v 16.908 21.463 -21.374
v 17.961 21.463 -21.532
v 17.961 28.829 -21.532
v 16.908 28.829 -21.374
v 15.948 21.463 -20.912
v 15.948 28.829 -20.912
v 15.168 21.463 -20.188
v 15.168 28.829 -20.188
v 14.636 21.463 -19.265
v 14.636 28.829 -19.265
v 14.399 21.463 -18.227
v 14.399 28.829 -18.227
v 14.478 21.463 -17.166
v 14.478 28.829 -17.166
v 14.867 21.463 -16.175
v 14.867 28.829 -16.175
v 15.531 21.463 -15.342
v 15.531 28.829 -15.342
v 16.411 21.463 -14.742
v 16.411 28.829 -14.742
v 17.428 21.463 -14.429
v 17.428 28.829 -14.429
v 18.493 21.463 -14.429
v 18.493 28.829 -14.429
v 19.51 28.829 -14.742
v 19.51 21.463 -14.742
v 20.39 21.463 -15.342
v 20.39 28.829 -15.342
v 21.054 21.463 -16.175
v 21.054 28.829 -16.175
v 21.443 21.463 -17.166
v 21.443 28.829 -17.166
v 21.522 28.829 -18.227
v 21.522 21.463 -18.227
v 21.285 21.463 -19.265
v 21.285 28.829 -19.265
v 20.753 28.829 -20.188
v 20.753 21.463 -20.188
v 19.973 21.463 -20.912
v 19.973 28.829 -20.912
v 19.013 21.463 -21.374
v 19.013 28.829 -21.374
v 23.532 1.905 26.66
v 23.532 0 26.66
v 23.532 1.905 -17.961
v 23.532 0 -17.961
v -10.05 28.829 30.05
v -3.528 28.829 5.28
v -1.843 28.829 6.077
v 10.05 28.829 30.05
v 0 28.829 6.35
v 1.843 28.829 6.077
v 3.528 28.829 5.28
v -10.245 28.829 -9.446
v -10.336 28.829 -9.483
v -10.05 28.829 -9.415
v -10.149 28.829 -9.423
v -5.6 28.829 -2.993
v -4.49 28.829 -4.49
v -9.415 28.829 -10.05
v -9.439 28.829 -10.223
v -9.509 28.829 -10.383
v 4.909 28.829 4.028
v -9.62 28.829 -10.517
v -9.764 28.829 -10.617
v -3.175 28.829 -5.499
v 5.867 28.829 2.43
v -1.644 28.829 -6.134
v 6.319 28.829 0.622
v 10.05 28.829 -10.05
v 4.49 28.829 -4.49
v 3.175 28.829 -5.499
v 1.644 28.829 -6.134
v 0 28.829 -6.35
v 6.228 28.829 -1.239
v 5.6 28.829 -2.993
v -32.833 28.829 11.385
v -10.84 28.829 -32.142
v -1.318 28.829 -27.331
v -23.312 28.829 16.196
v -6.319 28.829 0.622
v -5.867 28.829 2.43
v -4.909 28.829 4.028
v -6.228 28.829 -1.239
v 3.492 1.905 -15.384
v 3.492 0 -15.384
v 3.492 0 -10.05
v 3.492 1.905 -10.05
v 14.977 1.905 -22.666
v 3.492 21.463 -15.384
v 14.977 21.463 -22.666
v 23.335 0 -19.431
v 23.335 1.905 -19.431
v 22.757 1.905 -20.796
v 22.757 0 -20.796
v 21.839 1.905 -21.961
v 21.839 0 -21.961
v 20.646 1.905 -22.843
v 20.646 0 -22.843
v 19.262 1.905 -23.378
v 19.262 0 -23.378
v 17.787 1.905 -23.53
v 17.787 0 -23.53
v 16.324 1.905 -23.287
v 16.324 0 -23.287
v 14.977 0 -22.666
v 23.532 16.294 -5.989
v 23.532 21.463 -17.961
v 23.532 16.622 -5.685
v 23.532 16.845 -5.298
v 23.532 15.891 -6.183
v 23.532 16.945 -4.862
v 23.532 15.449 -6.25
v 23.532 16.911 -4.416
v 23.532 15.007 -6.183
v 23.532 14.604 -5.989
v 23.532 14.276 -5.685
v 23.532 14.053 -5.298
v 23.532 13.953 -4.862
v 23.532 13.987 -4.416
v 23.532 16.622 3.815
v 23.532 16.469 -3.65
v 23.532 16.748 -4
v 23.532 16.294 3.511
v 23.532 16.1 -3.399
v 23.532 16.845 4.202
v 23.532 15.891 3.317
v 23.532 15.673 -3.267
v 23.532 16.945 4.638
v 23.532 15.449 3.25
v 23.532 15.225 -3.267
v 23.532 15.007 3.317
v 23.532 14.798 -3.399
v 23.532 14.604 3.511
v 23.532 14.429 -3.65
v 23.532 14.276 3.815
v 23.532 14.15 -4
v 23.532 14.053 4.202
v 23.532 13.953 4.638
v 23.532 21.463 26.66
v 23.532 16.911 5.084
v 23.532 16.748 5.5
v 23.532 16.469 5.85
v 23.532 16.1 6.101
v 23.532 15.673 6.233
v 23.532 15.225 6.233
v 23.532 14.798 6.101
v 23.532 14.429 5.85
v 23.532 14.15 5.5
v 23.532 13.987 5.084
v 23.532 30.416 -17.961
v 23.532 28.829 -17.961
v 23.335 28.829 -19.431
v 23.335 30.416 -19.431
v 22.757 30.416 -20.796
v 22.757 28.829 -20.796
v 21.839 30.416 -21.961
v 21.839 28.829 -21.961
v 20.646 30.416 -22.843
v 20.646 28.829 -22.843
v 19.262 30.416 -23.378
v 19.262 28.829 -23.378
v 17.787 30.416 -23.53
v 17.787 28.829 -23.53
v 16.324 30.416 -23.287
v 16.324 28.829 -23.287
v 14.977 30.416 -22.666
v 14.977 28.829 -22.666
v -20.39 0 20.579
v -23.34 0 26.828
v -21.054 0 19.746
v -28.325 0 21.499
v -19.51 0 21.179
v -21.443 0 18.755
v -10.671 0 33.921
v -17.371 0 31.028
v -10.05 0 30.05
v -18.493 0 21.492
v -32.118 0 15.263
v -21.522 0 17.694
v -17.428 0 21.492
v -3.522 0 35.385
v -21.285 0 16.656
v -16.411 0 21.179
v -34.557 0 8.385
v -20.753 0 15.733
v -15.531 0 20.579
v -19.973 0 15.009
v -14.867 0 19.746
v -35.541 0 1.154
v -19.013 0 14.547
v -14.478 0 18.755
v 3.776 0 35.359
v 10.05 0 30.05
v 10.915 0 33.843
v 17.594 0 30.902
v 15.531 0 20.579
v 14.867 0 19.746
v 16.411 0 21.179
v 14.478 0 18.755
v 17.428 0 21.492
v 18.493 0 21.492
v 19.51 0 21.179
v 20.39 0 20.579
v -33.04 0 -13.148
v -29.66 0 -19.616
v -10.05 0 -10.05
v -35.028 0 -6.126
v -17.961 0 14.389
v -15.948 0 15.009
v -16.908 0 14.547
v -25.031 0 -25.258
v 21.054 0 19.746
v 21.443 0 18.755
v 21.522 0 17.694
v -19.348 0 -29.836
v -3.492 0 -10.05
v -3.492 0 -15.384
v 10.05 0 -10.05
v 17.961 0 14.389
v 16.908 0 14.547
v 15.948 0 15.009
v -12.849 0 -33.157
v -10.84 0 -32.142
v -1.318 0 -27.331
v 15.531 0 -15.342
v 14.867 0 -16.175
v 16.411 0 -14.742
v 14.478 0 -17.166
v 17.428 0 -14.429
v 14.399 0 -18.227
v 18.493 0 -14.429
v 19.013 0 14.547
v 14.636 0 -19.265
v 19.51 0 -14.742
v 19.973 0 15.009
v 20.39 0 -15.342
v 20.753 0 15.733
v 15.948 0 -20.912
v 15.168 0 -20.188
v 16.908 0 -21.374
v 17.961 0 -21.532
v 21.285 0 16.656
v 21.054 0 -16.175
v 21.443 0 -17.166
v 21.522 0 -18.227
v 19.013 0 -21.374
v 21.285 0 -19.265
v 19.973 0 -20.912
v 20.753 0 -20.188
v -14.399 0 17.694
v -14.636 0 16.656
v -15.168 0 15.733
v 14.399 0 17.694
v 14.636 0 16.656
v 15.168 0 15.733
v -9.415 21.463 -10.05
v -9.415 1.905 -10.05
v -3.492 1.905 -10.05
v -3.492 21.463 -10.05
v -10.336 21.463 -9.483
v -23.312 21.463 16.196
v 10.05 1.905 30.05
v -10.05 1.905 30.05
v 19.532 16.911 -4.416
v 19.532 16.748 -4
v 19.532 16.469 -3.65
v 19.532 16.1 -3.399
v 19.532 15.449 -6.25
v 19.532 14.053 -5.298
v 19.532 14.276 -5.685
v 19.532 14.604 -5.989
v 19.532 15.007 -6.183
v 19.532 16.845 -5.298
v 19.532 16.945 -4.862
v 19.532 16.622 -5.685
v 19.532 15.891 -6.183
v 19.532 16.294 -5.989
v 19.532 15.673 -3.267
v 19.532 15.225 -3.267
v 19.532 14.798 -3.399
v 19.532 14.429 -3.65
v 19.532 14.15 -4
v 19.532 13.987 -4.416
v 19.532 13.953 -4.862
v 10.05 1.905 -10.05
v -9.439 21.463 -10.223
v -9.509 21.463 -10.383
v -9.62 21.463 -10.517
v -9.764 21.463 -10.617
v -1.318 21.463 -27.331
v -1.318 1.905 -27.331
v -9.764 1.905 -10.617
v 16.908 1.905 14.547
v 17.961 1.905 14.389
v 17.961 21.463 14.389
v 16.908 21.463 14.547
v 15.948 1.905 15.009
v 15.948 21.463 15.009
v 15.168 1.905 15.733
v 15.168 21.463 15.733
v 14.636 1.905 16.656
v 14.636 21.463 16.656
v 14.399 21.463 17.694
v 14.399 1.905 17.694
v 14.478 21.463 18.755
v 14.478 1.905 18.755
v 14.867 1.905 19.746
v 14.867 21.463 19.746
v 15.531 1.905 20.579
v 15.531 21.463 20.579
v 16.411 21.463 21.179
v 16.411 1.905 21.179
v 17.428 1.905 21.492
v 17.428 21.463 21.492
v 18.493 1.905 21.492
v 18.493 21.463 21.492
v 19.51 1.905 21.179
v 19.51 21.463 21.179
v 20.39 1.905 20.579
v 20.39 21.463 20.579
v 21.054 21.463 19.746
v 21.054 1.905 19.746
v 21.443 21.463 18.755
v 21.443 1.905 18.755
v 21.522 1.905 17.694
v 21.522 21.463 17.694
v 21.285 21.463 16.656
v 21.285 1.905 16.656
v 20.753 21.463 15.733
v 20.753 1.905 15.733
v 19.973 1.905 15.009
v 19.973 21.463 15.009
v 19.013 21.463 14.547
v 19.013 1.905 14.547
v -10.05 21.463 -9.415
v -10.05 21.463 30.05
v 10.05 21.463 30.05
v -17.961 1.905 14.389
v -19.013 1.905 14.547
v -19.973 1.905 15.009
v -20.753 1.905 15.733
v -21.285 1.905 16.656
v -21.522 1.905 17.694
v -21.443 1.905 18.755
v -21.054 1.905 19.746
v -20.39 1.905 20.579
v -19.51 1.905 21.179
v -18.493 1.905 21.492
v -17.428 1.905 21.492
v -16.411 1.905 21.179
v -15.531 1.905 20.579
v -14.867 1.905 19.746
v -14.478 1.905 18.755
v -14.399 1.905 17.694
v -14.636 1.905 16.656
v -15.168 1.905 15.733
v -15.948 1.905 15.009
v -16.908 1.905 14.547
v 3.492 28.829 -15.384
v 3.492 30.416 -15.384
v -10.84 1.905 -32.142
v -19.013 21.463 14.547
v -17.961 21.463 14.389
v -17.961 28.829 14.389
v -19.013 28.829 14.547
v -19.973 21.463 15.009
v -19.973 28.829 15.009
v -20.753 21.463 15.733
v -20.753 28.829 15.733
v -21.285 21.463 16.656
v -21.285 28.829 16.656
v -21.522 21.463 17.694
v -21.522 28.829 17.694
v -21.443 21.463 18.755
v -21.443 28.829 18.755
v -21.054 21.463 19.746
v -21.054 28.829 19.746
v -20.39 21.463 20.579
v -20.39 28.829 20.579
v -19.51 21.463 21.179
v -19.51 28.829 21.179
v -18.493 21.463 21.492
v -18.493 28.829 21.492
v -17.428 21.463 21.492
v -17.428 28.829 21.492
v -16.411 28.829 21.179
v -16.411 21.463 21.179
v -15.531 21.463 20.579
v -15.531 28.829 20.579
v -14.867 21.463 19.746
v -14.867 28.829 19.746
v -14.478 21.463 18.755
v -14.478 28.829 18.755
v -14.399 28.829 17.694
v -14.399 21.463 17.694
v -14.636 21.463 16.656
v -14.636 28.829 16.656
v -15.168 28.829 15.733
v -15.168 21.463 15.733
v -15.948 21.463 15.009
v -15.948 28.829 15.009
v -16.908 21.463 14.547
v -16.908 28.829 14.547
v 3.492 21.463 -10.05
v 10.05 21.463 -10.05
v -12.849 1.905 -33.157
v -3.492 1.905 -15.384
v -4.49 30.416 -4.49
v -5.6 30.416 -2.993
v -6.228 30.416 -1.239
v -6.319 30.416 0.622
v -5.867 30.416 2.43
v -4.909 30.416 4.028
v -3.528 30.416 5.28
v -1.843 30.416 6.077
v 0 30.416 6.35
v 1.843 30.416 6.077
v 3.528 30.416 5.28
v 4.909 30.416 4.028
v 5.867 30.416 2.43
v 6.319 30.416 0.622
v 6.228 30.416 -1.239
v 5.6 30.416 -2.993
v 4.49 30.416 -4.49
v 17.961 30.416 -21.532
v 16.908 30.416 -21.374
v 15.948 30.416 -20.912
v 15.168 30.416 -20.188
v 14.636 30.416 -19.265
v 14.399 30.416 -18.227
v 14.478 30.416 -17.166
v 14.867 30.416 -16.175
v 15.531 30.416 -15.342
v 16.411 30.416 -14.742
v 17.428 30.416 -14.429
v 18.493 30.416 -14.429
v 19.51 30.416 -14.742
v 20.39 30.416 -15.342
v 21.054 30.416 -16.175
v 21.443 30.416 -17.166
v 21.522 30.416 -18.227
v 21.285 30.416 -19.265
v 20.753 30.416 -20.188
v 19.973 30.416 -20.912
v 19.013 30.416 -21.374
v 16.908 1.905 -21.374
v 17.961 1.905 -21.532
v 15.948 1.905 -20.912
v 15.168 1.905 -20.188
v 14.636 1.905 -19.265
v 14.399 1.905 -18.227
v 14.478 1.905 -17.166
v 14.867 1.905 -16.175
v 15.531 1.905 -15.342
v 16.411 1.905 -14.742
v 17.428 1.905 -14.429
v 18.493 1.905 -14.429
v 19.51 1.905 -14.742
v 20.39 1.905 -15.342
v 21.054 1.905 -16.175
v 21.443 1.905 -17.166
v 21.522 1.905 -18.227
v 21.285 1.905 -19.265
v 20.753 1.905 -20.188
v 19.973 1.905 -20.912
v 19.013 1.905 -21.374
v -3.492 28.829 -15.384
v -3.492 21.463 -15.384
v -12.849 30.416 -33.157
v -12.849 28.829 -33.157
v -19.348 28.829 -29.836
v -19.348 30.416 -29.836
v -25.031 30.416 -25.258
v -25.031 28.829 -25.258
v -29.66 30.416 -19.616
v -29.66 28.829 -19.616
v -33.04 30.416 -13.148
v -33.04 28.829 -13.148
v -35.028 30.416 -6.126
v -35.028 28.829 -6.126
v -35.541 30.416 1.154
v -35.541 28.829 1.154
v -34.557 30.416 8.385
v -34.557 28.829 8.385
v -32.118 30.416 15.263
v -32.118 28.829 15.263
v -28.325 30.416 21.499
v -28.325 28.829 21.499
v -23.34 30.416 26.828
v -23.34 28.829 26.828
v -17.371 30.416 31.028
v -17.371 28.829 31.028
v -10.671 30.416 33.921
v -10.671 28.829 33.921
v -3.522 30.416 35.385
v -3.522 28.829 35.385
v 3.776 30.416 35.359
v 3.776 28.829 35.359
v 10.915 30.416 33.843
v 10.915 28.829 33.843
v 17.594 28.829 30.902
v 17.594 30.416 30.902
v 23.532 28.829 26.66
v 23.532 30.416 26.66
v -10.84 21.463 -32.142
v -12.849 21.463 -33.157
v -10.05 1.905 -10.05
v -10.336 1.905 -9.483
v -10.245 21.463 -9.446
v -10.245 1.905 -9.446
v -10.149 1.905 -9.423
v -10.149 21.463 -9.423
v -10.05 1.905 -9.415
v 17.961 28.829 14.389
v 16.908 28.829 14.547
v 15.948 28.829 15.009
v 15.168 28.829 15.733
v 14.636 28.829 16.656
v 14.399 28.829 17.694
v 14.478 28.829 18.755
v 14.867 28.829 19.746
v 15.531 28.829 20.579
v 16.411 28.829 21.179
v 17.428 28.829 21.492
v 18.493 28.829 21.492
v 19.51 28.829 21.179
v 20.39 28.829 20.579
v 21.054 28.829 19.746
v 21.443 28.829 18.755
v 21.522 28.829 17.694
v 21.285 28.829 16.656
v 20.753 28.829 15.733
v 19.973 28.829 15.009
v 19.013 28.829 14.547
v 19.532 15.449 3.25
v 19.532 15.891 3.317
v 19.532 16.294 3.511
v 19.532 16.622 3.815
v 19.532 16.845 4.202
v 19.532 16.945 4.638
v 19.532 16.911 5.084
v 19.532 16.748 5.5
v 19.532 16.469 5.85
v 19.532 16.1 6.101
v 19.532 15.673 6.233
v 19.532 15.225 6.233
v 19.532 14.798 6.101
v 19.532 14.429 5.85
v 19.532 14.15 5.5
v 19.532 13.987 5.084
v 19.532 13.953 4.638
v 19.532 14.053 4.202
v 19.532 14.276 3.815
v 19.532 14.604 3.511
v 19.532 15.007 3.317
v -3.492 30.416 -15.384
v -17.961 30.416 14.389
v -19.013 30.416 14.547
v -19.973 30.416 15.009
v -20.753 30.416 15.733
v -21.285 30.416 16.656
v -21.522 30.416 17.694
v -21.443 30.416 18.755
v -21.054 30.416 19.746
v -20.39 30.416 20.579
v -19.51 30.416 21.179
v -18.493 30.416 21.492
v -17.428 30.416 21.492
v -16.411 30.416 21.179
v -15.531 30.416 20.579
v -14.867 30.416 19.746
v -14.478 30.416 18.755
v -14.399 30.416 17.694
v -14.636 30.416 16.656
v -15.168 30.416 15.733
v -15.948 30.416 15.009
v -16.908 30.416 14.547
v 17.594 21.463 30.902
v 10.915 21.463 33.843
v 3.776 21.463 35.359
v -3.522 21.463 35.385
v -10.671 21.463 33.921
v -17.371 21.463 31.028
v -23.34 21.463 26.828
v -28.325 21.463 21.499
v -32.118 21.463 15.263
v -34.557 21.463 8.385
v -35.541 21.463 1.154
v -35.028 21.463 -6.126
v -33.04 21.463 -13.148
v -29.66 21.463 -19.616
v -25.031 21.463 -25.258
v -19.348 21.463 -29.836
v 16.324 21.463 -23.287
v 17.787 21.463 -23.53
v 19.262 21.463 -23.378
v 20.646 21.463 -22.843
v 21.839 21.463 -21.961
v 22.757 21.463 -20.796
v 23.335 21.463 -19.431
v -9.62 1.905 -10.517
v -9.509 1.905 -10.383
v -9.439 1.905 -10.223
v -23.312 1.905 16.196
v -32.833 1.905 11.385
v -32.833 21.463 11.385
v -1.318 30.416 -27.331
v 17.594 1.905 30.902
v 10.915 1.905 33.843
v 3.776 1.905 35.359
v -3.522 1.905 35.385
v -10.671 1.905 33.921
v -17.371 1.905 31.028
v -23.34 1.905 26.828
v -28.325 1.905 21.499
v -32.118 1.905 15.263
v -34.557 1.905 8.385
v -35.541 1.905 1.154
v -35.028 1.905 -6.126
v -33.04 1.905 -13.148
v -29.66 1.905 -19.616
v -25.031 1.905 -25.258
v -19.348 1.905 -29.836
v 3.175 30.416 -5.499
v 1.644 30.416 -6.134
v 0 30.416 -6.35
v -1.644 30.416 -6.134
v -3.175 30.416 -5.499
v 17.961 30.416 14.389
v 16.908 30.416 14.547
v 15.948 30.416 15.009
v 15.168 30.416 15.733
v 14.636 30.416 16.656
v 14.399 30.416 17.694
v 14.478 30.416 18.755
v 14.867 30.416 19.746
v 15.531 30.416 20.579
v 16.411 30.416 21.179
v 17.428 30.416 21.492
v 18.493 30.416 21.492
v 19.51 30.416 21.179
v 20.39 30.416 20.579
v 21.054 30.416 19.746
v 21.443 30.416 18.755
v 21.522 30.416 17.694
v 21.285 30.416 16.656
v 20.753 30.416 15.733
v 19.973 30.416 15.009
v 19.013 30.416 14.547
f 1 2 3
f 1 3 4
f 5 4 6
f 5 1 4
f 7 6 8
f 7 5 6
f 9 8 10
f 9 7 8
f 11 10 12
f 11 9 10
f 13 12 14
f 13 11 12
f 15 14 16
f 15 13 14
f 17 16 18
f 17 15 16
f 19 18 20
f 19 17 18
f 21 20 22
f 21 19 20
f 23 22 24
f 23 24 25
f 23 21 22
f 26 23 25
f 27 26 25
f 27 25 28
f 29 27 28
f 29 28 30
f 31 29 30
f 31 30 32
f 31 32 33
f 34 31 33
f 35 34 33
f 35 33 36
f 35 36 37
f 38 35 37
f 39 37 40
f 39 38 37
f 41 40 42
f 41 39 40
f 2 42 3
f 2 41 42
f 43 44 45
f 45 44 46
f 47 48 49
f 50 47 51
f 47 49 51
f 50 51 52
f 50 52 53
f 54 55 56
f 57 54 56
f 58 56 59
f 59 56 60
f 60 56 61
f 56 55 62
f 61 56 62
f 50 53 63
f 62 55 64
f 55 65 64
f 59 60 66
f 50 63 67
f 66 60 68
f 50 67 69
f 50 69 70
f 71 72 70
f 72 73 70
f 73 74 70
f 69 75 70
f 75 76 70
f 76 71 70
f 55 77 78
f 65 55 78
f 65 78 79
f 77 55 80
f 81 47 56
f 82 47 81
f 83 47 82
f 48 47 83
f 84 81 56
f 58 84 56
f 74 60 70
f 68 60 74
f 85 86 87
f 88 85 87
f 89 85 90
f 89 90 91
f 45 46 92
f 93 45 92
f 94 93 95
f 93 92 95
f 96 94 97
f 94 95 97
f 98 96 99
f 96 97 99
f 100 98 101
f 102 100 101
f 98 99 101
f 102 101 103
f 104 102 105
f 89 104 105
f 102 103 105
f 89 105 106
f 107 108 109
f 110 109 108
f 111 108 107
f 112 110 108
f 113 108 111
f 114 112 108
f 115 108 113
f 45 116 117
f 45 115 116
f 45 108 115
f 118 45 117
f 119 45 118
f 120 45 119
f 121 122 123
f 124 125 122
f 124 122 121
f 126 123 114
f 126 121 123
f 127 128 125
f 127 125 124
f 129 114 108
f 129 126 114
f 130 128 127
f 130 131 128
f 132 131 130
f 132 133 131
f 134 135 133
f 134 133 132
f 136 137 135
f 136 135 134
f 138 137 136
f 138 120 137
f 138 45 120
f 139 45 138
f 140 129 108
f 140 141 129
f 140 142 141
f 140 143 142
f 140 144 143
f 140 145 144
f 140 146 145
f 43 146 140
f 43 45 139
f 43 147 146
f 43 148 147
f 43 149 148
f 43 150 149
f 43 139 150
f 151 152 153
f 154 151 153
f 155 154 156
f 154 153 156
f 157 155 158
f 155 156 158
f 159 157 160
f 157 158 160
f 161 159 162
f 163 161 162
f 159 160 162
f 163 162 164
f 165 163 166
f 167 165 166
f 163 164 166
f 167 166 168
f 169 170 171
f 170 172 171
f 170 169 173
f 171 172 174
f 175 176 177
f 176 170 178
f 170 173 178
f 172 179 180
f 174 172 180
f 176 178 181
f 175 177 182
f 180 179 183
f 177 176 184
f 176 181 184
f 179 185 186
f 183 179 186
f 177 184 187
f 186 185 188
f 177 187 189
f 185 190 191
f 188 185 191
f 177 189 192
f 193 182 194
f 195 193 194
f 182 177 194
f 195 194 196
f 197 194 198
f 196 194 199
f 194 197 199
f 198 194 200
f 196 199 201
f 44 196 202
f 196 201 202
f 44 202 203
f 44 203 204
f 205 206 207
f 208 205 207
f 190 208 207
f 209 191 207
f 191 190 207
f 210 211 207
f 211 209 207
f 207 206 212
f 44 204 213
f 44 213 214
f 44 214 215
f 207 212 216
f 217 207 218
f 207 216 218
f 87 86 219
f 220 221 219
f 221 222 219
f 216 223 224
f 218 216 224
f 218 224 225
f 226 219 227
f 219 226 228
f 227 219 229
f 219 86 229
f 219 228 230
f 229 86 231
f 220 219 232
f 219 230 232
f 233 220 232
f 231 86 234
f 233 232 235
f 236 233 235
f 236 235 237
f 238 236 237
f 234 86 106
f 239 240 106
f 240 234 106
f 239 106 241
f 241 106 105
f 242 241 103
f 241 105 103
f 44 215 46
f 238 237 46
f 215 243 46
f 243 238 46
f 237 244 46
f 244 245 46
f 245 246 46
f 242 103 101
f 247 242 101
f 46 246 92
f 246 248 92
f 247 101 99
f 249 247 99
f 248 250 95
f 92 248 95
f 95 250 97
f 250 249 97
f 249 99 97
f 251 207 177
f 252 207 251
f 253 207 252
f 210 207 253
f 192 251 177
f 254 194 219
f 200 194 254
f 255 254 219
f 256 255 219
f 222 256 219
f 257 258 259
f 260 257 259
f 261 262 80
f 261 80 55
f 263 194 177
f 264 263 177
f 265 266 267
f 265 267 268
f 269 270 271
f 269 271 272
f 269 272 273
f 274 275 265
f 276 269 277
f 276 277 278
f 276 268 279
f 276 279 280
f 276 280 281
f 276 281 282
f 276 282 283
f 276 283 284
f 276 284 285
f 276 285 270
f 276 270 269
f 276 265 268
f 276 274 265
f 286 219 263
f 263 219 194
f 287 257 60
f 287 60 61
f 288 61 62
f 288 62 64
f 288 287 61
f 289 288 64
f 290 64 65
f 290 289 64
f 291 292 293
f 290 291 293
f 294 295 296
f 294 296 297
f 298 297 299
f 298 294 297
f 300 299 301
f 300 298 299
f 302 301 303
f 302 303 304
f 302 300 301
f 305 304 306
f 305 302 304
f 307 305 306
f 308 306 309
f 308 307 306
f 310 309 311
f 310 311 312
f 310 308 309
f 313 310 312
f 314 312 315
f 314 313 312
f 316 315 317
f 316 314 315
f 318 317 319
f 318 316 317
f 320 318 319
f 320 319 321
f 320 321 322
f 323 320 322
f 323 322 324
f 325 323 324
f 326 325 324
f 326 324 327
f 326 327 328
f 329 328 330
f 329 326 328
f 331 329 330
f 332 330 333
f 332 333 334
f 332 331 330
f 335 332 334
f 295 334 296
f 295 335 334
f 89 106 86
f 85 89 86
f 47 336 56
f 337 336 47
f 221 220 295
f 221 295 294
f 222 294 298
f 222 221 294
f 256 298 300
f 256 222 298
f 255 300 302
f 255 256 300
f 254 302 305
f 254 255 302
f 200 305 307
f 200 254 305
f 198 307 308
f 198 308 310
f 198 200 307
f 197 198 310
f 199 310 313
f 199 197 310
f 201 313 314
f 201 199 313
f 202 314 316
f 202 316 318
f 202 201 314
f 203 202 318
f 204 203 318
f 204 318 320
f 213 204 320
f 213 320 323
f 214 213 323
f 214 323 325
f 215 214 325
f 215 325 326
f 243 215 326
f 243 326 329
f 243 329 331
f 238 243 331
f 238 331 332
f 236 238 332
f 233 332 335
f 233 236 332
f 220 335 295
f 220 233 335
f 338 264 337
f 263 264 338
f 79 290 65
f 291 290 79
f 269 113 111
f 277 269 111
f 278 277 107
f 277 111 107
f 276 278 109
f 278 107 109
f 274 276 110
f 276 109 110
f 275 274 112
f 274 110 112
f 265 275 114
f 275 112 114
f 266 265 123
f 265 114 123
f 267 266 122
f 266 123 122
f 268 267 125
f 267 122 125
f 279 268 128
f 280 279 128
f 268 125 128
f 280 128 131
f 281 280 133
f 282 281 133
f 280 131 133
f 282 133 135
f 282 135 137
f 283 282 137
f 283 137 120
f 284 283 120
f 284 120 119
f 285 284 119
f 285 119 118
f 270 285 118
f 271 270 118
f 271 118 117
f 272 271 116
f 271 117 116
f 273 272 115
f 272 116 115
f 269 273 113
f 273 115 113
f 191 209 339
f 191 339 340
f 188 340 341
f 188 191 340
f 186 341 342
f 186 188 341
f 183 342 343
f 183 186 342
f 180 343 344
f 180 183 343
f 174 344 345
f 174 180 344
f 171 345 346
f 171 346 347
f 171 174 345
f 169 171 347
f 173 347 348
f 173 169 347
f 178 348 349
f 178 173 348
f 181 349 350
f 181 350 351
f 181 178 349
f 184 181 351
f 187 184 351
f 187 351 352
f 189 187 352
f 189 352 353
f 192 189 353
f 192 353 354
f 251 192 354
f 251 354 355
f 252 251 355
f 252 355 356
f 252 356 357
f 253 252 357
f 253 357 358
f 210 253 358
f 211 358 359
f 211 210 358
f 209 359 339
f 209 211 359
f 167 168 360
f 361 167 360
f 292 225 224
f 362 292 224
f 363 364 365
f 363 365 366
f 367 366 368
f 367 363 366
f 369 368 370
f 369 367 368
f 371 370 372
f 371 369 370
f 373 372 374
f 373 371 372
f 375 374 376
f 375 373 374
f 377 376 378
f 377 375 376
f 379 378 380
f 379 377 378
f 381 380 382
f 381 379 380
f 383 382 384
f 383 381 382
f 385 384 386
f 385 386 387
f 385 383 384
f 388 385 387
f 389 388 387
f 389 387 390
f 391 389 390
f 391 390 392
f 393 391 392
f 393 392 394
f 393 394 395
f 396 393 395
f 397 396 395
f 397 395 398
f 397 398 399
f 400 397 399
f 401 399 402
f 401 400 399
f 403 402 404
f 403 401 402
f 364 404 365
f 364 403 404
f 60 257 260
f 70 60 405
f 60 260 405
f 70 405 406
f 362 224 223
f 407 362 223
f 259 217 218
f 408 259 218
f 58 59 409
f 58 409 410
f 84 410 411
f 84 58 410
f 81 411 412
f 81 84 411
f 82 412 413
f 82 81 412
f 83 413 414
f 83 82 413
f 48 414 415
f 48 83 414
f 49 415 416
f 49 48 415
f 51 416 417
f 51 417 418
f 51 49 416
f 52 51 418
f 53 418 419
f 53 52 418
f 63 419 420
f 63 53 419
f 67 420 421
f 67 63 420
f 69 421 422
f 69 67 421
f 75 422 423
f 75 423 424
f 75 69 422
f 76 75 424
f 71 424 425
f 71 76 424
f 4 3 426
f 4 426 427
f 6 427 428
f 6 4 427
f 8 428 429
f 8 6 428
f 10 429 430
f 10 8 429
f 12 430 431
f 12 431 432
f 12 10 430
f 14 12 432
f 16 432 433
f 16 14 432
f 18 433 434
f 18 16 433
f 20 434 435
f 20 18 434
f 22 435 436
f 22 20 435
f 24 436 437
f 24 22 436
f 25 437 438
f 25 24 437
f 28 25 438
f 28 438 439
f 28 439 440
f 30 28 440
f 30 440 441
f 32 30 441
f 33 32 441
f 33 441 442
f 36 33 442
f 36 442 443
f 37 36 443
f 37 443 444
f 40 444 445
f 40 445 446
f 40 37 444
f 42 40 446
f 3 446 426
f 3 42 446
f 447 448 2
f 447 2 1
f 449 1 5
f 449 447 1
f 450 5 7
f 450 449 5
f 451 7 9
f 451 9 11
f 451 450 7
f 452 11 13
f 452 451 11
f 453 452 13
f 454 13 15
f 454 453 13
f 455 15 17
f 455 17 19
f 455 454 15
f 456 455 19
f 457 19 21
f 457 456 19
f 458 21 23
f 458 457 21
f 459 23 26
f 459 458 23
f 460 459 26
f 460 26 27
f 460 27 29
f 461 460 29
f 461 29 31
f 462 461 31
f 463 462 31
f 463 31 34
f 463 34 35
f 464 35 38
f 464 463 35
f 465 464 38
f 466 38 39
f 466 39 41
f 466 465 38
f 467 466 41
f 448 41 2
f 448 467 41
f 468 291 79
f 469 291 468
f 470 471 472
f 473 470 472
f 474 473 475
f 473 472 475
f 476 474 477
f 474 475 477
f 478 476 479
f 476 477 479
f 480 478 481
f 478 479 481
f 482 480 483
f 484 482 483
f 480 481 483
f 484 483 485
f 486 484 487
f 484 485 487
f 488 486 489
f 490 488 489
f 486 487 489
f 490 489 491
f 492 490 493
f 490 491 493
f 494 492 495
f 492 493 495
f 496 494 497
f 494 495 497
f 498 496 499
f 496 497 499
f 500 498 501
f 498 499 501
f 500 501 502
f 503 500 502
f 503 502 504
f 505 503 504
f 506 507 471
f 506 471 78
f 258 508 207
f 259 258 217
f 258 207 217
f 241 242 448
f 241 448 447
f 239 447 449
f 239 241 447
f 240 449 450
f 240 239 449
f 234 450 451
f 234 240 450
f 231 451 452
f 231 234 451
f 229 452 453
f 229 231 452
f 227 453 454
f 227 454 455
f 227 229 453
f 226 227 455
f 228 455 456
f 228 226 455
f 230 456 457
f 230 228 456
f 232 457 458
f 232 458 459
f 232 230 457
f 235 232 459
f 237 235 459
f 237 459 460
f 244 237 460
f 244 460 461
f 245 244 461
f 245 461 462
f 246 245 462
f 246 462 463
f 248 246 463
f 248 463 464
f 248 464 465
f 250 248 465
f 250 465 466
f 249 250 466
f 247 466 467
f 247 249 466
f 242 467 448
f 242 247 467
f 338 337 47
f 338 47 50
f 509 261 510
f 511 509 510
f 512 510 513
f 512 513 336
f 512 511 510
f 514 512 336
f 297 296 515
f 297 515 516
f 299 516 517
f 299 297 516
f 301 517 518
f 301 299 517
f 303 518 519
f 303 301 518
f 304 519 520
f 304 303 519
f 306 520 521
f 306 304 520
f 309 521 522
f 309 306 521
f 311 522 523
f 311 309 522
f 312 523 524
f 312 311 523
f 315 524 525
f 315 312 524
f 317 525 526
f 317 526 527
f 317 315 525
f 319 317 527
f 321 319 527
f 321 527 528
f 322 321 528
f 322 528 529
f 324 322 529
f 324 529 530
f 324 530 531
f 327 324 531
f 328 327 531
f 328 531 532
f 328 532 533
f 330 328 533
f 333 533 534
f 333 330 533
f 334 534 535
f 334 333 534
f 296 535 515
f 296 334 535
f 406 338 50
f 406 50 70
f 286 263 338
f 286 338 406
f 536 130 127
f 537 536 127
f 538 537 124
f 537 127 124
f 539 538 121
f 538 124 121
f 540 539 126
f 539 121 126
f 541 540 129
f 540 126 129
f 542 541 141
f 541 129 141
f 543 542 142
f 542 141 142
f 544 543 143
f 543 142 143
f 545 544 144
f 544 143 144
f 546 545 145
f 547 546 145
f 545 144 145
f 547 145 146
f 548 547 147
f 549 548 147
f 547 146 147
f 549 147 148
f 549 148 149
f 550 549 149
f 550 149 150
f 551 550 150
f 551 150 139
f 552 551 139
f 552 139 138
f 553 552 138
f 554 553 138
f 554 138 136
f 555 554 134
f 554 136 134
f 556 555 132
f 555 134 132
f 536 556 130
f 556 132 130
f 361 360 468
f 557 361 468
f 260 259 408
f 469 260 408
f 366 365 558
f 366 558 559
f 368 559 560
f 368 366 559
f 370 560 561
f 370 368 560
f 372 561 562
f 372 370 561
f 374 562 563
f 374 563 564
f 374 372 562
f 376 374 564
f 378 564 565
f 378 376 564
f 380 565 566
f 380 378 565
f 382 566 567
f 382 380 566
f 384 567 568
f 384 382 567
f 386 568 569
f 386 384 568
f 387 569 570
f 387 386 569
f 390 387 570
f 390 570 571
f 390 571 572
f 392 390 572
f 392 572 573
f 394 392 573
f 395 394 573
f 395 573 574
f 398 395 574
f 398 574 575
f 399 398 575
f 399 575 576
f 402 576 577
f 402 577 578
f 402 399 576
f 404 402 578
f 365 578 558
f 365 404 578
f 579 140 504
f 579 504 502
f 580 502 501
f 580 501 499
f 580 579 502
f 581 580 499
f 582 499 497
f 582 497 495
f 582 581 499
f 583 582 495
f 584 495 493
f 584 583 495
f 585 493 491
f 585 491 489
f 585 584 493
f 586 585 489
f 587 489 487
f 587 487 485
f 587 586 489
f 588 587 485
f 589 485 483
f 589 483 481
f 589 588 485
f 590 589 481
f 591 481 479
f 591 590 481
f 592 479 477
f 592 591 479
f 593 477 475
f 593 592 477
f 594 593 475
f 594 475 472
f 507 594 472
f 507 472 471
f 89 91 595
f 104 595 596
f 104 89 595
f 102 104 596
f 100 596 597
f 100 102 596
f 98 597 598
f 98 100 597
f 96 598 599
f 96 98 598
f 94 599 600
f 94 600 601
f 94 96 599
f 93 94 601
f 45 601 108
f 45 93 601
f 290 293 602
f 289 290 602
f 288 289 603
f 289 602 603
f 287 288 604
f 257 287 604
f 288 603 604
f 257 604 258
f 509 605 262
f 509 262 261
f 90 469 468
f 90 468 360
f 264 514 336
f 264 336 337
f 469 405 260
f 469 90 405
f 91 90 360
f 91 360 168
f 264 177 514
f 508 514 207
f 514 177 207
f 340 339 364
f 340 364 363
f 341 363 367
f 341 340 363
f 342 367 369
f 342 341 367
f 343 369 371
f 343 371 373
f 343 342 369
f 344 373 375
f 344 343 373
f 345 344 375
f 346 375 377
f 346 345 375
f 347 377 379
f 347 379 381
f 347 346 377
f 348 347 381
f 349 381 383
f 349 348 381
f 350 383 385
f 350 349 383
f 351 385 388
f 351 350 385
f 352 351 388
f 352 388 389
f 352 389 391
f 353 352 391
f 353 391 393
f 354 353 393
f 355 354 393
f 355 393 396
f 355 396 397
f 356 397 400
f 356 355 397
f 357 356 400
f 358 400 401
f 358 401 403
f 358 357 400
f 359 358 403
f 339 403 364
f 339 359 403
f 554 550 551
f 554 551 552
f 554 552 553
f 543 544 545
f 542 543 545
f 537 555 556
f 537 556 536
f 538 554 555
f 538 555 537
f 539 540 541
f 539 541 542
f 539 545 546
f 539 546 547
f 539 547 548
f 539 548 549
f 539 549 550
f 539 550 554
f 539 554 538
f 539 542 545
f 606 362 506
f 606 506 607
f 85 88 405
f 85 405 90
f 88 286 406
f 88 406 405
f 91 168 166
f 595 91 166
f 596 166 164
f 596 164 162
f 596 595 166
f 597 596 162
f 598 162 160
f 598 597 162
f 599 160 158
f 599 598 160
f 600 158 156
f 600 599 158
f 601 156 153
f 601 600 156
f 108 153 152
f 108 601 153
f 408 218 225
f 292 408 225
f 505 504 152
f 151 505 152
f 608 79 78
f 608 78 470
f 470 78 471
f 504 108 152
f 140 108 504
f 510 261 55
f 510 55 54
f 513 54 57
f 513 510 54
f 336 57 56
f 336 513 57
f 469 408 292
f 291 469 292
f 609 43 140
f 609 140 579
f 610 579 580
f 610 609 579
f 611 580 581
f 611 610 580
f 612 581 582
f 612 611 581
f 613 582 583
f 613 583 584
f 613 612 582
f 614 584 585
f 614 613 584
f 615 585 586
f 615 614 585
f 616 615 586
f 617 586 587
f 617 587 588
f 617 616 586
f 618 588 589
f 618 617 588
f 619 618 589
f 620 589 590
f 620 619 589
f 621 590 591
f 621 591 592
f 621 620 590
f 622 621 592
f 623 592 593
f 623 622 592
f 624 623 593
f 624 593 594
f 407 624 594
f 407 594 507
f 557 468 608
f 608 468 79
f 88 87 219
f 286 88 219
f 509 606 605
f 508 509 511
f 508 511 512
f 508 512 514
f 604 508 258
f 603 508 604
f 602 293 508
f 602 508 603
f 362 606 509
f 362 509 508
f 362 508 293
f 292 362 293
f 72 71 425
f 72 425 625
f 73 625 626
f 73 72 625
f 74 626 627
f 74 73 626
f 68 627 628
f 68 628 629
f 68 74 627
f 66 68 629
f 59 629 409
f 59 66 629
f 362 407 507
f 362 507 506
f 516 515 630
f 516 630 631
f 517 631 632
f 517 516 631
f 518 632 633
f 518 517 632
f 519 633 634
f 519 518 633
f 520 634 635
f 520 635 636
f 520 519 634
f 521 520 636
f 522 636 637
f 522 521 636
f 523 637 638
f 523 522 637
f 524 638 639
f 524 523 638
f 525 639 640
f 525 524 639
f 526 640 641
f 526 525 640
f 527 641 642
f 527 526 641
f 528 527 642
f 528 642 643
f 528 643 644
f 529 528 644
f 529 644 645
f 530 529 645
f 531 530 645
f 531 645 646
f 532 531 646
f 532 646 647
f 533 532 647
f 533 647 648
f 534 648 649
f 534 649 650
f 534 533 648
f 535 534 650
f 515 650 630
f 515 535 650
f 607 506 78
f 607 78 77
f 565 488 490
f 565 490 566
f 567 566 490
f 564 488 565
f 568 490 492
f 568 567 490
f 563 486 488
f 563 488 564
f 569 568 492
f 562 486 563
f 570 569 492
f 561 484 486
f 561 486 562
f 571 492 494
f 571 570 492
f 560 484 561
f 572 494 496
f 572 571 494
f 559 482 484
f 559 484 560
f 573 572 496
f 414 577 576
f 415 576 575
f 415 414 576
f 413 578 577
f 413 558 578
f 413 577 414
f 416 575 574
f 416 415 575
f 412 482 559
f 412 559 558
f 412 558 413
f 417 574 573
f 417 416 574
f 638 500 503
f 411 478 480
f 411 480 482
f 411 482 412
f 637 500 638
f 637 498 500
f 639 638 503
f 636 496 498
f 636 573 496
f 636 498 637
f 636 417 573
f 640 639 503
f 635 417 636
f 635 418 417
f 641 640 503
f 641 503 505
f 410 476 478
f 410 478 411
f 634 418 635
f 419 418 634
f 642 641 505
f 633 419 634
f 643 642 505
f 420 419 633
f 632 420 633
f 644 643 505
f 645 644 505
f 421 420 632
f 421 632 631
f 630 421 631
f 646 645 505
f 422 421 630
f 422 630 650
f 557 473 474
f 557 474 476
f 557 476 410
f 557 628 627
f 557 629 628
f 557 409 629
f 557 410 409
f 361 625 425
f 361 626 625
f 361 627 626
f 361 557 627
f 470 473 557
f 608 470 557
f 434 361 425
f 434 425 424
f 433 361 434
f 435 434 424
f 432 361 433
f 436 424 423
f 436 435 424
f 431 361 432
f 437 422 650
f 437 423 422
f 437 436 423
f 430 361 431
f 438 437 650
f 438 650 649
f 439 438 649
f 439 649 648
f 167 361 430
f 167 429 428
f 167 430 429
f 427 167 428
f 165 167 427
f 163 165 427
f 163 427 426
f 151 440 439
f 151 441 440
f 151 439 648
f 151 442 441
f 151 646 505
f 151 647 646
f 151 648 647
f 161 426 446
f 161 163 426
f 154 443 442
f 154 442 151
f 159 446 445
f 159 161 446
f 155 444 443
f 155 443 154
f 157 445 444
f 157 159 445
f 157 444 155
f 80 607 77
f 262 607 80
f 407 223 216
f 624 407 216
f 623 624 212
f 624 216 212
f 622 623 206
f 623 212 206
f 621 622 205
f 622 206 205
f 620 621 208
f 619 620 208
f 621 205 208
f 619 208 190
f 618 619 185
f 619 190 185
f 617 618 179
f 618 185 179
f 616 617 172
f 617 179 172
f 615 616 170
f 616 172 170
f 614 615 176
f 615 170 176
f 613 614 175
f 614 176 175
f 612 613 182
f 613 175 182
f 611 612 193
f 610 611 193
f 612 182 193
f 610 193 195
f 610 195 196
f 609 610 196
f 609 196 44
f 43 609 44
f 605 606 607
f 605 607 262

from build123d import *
from build123d.topology import SkipClean

# Parameters (mm, degrees)
SKETCH2_R           = 3.571875
BOSS_EXTRUDE1_DEPTH = 1.905
SKETCH3_R           = 3.571875
BOSS_EXTRUDE2_DEPTH = 19.558
SKETCH4_R           = 3.571875
BOSS_EXTRUDE3_DEPTH = 7.366
SKETCH5_R           = 3.571875
BOSS_EXTRUDE4_DEPTH = 1.5875
SKETCH6_R           = 1.5
CUT_EXTRUDE3_DEPTH  = 4


with BuildPart() as part:
    # Sketch2 → Boss-Extrude1 (new body)
    with BuildSketch(Plane(origin=(0, 0, 0), x_dir=(1, 0, 0), z_dir=(0, 1, 0))):
        with BuildLine():
            Line((10.05, -30.05), (-10.05, -30.05))
            Line((-10.05, -30.05), (-10.05, 10.05))
            Line((-10.05, 10.05), (-3.4925, 10.05))
            Line((-3.4925, 10.05), (-3.4925, 15.384))
            Line((-3.4925, 15.384), (-1.318232079, 27.330889022))
            Line((-1.318232079, 27.330889022), (-10.839769253, 32.141975578))
            Line((-10.839769253, 32.141975578), (-12.849275114, 33.15734804))
            ThreePointArc((-12.849275114, 33.15734804), (-30.38177824, -18.478667457), (23.532387242, -26.659714002))
            Line((23.532387242, -26.659714002), (23.532387242, -17.960512242))
            Line((23.532387242, -17.960512242), (23.532387242, 17.960512242))
            ThreePointArc((23.532387242, 17.960512242), (20.645690581, 22.842684741), (14.976700581, 22.666110928))
            Line((14.976700581, 22.666110928), (3.4925, 15.384))
            Line((3.4925, 15.384), (3.4925, 10.05))
            Line((3.4925, 10.05), (10.05, 10.05))
            Line((10.05, 10.05), (10.05, -30.05))
        make_face()
        with Locations(Location((17.960512242, 17.960512242, 0), (0, 0, 90))):
            Circle(SKETCH2_R, mode=Mode.SUBTRACT)
        with Locations(Location((17.960512242, -17.960512242, 0), (0, 0, 90))):
            Circle(SKETCH2_R, mode=Mode.SUBTRACT)
        with Locations(Location((-17.960512242, -17.960512242, 0), (0, 0, 90))):
            Circle(SKETCH2_R, mode=Mode.SUBTRACT)
    extrude(amount=BOSS_EXTRUDE1_DEPTH)

    # Sketch3 → Boss-Extrude2 (add)
    # profile 1 of 2: a face of its own
    with SkipClean():  # the faces are left unmerged after this step: merging them gives an invalid solid
        with BuildSketch(Plane(origin=(0, 1.905, 0), x_dir=(1, 0, 0), z_dir=(0, 1, 0))):
            with BuildLine():
                Line((-10.839769253, 32.141975578), (-32.833307795, -11.385051501))
                Line((-32.833307795, -11.385051501), (-23.311770621, -16.196138057))
                Line((-23.311770621, -16.196138057), (-10.3363742, 9.483241835))
                ThreePointArc((-10.3363742, 9.483241835), (-10.197196408, 9.432296011), (-10.05, 9.415))
                Line((-10.05, 9.415), (-10.05, -30.05))
                Line((-10.05, -30.05), (10.05, -30.05))
                Line((10.05, -30.05), (10.05, 10.05))
                Line((10.05, 10.05), (3.4925, 10.05))
                Line((3.4925, 10.05), (3.4925, 15.384))
                Line((3.4925, 15.384), (14.976700581, 22.666110928))
                ThreePointArc((14.976700581, 22.666110928), (20.645690581, 22.842684741), (23.532387242, 17.960512242))
                Line((23.532387242, 17.960512242), (23.532387242, -26.659714002))
                ThreePointArc((23.532387242, -26.659714002), (-30.38177824, -18.478667457), (-12.849275114, 33.15734804))
                Line((-12.849275114, 33.15734804), (-10.839769253, 32.141975578))
            make_face()
            with Locations(Location((17.960512242, 17.960512242, 0), (0, 0, 90))):
                Circle(SKETCH3_R, mode=Mode.SUBTRACT)
            with Locations(Location((17.960512242, -17.960512242, 0), (0, 0, 90))):
                Circle(SKETCH3_R, mode=Mode.SUBTRACT)
            with Locations(Location((-17.960512242, -17.960512242, 0), (0, 0, 90))):
                Circle(SKETCH3_R, mode=Mode.SUBTRACT)
        # profile 2 of 2: a face of its own
        with BuildSketch(Plane(origin=(0, 1.905, 0), x_dir=(1, 0, 0), z_dir=(0, 1, 0))):
            with BuildLine():
                Line((-1.318232079, 27.330889022), (-9.7636258, 10.616758165))
                ThreePointArc((-9.7636258, 10.616758165), (-9.509133743, 10.382699101), (-9.415, 10.05))
                Line((-9.415, 10.05), (-3.4925, 10.05))
                Line((-3.4925, 10.05), (-3.4925, 15.384))
                Line((-3.4925, 15.384), (-1.318232079, 27.330889022))
            make_face()
        extrude(amount=BOSS_EXTRUDE2_DEPTH)

    # Sketch4 → Boss-Extrude3 (add)
    with SkipClean():  # the faces are left unmerged after this step: merging them gives an invalid solid
        with BuildSketch(Plane(origin=(0, 21.463, 0), x_dir=(1, 0, 0), z_dir=(0, 1, 0))):
            with BuildLine():
                Line((0, 10.05), (-3.4925, 10.05))
                Line((-3.4925, 10.05), (-9.415, 10.05))
                ThreePointArc((-9.415, 10.05), (-9.509133743, 10.382699101), (-9.7636258, 10.616758165))
                Line((-9.7636258, 10.616758165), (-1.318232079, 27.330889022))
                Line((-1.318232079, 27.330889022), (-3.4925, 15.384))
                Line((-3.4925, 15.384), (3.4925, 15.384))
                Line((3.4925, 15.384), (14.976700581, 22.666110928))
                ThreePointArc((14.976700581, 22.666110928), (20.645690581, 22.842684741), (23.532387242, 17.960512242))
                Line((23.532387242, 17.960512242), (23.532387242, -26.659714002))
                ThreePointArc((23.532387242, -26.659714002), (-30.38177824, -18.478667457), (-12.849275114, 33.15734804))
                Line((-12.849275114, 33.15734804), (-10.839769253, 32.141975578))
                Line((-10.839769253, 32.141975578), (-32.833307795, -11.385051501))
                Line((-32.833307795, -11.385051501), (-23.311770621, -16.196138057))
                Line((-23.311770621, -16.196138057), (-10.3363742, 9.483241835))
                ThreePointArc((-10.3363742, 9.483241835), (-10.197196408, 9.432296011), (-10.05, 9.415))
                Line((-10.05, 9.415), (-10.05, -30.05))
                Line((-10.05, -30.05), (10.05, -30.05))
                Line((10.05, -30.05), (10.05, 10.05))
                Line((10.05, 10.05), (3.4925, 10.05))
                Line((3.4925, 10.05), (0, 10.05))
            make_face()
            with Locations(Location((17.960512242, 17.960512242, 0), (0, 0, 90))):
                Circle(SKETCH4_R, mode=Mode.SUBTRACT)
            with Locations(Location((17.960512242, -17.960512242, 0), (0, 0, 90))):
                Circle(SKETCH4_R, mode=Mode.SUBTRACT)
            with Locations(Location((-17.960512242, -17.960512242, 0), (0, 0, 90))):
                Circle(SKETCH4_R, mode=Mode.SUBTRACT)
        extrude(amount=BOSS_EXTRUDE3_DEPTH)

    # Sketch5 → Boss-Extrude4 (add)
    with SkipClean():  # the faces are left unmerged after this step: merging them gives an invalid solid
        with BuildSketch(Plane(origin=(0, 28.829, 0), x_dir=(1, 0, 0), z_dir=(0, 1, 0))):
            with BuildLine():
                Line((3.4925, 15.384), (-3.4925, 15.384))
                Line((-3.4925, 15.384), (-1.318232079, 27.330889022))
                Line((-1.318232079, 27.330889022), (-12.849275114, 33.15734804))
                ThreePointArc((-12.849275114, 33.15734804), (-30.38177824, -18.478667457), (23.532387242, -26.659714002))
                Line((23.532387242, -26.659714002), (23.532387242, 17.960512242))
                ThreePointArc((23.532387242, 17.960512242), (20.645690581, 22.842684741), (14.976700581, 22.666110928))
                Line((14.976700581, 22.666110928), (3.4925, 15.384))
            make_face()
            with Locations(Location((17.960512242, 17.960512242, 0), (0, 0, 90))):
                Circle(SKETCH5_R, mode=Mode.SUBTRACT)
            with Locations(Location((17.960512242, -17.960512242, 0), (0, 0, 90))):
                Circle(SKETCH5_R, mode=Mode.SUBTRACT)
            with Locations(Location((-17.960512242, -17.960512242, 0), (0, 0, 90))):
                Circle(SKETCH5_R, mode=Mode.SUBTRACT)
            with BuildLine():
                ThreePointArc((4.490128061, 4.490128061), (0, 6.35), (-4.490128061, 4.490128061))
                ThreePointArc((-4.490128061, 4.490128061), (0, -6.35), (4.490128061, 4.490128061))
            make_face(mode=Mode.SUBTRACT)
        extrude(amount=BOSS_EXTRUDE4_DEPTH)

    # Sketch6 → Cut-Extrude3 (cut)
    with SkipClean():  # the faces are left unmerged after this step: merging them gives an invalid solid
        with BuildSketch(Plane(origin=(23.532387242, 0, 0), x_dir=(0, 0, -1), z_dir=(1, 0, 0))):
            with Locations((-4.75, 15.449)):
                Circle(SKETCH6_R)
            with Locations((4.75, 15.449)):
                Circle(SKETCH6_R)
        extrude(amount=-CUT_EXTRUDE3_DEPTH, mode=Mode.SUBTRACT)


solid = part.part
